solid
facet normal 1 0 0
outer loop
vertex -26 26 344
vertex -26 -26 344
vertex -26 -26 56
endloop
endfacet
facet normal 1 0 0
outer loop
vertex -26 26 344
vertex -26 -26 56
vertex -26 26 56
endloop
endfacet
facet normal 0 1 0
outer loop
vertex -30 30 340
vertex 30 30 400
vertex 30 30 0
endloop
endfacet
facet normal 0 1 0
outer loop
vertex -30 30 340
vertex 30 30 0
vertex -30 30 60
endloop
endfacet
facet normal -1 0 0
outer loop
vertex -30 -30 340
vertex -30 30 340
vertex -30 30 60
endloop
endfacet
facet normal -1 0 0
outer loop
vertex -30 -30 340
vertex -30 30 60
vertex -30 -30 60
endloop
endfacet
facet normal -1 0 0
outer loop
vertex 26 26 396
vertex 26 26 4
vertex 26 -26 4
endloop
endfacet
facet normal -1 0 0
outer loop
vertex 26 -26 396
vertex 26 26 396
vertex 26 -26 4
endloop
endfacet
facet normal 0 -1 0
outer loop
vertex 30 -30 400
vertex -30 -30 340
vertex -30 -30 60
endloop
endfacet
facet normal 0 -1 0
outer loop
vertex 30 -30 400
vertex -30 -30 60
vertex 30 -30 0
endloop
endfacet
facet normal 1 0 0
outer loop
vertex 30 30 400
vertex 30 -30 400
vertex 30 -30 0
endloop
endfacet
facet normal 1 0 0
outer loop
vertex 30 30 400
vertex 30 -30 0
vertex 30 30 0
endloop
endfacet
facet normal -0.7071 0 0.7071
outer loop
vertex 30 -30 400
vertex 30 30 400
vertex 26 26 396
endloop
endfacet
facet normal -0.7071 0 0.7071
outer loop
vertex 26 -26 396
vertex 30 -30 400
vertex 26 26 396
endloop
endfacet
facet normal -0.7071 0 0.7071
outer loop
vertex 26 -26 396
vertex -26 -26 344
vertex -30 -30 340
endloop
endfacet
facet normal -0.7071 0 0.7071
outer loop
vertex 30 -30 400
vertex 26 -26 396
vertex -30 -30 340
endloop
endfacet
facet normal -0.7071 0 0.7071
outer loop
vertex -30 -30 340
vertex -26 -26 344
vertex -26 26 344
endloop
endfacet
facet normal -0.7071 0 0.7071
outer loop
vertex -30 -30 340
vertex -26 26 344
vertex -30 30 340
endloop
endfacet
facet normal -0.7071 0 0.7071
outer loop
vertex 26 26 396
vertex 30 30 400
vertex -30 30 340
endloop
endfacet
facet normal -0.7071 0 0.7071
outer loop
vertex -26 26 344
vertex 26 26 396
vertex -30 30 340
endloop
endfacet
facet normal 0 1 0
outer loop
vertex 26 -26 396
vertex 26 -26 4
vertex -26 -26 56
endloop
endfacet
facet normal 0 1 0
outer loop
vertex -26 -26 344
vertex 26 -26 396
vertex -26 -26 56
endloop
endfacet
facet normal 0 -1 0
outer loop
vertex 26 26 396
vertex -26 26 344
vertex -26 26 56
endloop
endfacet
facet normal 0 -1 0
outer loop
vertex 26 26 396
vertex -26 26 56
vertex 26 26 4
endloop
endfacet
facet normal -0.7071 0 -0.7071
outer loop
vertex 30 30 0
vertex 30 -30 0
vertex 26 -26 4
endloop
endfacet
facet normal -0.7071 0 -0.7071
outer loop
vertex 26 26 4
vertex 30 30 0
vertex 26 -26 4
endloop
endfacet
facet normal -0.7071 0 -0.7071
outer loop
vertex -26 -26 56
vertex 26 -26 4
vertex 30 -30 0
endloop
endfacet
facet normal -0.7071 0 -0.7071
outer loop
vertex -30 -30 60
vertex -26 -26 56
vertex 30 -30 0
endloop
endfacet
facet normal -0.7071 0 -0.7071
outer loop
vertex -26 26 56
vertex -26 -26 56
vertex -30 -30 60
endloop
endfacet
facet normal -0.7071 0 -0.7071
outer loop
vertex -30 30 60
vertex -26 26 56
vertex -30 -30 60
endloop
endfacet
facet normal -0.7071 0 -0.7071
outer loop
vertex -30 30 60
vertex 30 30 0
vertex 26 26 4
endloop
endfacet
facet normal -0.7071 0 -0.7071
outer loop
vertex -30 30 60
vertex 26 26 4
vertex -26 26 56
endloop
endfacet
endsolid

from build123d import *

# Parameters (mm, degrees)
SKETCH1_W          = 60
SKETCH1_H          = 60
SKETCH1_W_2        = 52
SKETCH1_H_2        = 52
CUT_EXTRUDE1_DEPTH = 61.0000001


with BuildPart() as part:
    # Sweep1: sweep along a curve in space
    with BuildLine() as sweep1_path:
        add(Edge.make_bspline(
            [(0, 0, 0), (0, 0, 400)],
            knots=[0, 0, 1, 1], degree=1))
    # Sketch1 → Sweep1 (sweep)
    with BuildSketch(Plane.XY):
        Rectangle(SKETCH1_W, SKETCH1_H)
        Rectangle(SKETCH1_W_2, SKETCH1_H_2, mode=Mode.SUBTRACT)
    sweep(path=sweep1_path.line)

    # Sketch2 → Cut-Extrude1 (cut, through all)
    with BuildSketch(Plane(origin=(0, 30, 0), x_dir=(1, 0, 0), z_dir=(0, 1, 0))):
        Polygon((30, 0), (-30, -60), (-30, 0), align=None)
        Polygon((30, -400), (-30, -340), (-30, -400), align=None)
    extrude(amount=-CUT_EXTRUDE1_DEPTH, mode=Mode.SUBTRACT)


solid = part.part
